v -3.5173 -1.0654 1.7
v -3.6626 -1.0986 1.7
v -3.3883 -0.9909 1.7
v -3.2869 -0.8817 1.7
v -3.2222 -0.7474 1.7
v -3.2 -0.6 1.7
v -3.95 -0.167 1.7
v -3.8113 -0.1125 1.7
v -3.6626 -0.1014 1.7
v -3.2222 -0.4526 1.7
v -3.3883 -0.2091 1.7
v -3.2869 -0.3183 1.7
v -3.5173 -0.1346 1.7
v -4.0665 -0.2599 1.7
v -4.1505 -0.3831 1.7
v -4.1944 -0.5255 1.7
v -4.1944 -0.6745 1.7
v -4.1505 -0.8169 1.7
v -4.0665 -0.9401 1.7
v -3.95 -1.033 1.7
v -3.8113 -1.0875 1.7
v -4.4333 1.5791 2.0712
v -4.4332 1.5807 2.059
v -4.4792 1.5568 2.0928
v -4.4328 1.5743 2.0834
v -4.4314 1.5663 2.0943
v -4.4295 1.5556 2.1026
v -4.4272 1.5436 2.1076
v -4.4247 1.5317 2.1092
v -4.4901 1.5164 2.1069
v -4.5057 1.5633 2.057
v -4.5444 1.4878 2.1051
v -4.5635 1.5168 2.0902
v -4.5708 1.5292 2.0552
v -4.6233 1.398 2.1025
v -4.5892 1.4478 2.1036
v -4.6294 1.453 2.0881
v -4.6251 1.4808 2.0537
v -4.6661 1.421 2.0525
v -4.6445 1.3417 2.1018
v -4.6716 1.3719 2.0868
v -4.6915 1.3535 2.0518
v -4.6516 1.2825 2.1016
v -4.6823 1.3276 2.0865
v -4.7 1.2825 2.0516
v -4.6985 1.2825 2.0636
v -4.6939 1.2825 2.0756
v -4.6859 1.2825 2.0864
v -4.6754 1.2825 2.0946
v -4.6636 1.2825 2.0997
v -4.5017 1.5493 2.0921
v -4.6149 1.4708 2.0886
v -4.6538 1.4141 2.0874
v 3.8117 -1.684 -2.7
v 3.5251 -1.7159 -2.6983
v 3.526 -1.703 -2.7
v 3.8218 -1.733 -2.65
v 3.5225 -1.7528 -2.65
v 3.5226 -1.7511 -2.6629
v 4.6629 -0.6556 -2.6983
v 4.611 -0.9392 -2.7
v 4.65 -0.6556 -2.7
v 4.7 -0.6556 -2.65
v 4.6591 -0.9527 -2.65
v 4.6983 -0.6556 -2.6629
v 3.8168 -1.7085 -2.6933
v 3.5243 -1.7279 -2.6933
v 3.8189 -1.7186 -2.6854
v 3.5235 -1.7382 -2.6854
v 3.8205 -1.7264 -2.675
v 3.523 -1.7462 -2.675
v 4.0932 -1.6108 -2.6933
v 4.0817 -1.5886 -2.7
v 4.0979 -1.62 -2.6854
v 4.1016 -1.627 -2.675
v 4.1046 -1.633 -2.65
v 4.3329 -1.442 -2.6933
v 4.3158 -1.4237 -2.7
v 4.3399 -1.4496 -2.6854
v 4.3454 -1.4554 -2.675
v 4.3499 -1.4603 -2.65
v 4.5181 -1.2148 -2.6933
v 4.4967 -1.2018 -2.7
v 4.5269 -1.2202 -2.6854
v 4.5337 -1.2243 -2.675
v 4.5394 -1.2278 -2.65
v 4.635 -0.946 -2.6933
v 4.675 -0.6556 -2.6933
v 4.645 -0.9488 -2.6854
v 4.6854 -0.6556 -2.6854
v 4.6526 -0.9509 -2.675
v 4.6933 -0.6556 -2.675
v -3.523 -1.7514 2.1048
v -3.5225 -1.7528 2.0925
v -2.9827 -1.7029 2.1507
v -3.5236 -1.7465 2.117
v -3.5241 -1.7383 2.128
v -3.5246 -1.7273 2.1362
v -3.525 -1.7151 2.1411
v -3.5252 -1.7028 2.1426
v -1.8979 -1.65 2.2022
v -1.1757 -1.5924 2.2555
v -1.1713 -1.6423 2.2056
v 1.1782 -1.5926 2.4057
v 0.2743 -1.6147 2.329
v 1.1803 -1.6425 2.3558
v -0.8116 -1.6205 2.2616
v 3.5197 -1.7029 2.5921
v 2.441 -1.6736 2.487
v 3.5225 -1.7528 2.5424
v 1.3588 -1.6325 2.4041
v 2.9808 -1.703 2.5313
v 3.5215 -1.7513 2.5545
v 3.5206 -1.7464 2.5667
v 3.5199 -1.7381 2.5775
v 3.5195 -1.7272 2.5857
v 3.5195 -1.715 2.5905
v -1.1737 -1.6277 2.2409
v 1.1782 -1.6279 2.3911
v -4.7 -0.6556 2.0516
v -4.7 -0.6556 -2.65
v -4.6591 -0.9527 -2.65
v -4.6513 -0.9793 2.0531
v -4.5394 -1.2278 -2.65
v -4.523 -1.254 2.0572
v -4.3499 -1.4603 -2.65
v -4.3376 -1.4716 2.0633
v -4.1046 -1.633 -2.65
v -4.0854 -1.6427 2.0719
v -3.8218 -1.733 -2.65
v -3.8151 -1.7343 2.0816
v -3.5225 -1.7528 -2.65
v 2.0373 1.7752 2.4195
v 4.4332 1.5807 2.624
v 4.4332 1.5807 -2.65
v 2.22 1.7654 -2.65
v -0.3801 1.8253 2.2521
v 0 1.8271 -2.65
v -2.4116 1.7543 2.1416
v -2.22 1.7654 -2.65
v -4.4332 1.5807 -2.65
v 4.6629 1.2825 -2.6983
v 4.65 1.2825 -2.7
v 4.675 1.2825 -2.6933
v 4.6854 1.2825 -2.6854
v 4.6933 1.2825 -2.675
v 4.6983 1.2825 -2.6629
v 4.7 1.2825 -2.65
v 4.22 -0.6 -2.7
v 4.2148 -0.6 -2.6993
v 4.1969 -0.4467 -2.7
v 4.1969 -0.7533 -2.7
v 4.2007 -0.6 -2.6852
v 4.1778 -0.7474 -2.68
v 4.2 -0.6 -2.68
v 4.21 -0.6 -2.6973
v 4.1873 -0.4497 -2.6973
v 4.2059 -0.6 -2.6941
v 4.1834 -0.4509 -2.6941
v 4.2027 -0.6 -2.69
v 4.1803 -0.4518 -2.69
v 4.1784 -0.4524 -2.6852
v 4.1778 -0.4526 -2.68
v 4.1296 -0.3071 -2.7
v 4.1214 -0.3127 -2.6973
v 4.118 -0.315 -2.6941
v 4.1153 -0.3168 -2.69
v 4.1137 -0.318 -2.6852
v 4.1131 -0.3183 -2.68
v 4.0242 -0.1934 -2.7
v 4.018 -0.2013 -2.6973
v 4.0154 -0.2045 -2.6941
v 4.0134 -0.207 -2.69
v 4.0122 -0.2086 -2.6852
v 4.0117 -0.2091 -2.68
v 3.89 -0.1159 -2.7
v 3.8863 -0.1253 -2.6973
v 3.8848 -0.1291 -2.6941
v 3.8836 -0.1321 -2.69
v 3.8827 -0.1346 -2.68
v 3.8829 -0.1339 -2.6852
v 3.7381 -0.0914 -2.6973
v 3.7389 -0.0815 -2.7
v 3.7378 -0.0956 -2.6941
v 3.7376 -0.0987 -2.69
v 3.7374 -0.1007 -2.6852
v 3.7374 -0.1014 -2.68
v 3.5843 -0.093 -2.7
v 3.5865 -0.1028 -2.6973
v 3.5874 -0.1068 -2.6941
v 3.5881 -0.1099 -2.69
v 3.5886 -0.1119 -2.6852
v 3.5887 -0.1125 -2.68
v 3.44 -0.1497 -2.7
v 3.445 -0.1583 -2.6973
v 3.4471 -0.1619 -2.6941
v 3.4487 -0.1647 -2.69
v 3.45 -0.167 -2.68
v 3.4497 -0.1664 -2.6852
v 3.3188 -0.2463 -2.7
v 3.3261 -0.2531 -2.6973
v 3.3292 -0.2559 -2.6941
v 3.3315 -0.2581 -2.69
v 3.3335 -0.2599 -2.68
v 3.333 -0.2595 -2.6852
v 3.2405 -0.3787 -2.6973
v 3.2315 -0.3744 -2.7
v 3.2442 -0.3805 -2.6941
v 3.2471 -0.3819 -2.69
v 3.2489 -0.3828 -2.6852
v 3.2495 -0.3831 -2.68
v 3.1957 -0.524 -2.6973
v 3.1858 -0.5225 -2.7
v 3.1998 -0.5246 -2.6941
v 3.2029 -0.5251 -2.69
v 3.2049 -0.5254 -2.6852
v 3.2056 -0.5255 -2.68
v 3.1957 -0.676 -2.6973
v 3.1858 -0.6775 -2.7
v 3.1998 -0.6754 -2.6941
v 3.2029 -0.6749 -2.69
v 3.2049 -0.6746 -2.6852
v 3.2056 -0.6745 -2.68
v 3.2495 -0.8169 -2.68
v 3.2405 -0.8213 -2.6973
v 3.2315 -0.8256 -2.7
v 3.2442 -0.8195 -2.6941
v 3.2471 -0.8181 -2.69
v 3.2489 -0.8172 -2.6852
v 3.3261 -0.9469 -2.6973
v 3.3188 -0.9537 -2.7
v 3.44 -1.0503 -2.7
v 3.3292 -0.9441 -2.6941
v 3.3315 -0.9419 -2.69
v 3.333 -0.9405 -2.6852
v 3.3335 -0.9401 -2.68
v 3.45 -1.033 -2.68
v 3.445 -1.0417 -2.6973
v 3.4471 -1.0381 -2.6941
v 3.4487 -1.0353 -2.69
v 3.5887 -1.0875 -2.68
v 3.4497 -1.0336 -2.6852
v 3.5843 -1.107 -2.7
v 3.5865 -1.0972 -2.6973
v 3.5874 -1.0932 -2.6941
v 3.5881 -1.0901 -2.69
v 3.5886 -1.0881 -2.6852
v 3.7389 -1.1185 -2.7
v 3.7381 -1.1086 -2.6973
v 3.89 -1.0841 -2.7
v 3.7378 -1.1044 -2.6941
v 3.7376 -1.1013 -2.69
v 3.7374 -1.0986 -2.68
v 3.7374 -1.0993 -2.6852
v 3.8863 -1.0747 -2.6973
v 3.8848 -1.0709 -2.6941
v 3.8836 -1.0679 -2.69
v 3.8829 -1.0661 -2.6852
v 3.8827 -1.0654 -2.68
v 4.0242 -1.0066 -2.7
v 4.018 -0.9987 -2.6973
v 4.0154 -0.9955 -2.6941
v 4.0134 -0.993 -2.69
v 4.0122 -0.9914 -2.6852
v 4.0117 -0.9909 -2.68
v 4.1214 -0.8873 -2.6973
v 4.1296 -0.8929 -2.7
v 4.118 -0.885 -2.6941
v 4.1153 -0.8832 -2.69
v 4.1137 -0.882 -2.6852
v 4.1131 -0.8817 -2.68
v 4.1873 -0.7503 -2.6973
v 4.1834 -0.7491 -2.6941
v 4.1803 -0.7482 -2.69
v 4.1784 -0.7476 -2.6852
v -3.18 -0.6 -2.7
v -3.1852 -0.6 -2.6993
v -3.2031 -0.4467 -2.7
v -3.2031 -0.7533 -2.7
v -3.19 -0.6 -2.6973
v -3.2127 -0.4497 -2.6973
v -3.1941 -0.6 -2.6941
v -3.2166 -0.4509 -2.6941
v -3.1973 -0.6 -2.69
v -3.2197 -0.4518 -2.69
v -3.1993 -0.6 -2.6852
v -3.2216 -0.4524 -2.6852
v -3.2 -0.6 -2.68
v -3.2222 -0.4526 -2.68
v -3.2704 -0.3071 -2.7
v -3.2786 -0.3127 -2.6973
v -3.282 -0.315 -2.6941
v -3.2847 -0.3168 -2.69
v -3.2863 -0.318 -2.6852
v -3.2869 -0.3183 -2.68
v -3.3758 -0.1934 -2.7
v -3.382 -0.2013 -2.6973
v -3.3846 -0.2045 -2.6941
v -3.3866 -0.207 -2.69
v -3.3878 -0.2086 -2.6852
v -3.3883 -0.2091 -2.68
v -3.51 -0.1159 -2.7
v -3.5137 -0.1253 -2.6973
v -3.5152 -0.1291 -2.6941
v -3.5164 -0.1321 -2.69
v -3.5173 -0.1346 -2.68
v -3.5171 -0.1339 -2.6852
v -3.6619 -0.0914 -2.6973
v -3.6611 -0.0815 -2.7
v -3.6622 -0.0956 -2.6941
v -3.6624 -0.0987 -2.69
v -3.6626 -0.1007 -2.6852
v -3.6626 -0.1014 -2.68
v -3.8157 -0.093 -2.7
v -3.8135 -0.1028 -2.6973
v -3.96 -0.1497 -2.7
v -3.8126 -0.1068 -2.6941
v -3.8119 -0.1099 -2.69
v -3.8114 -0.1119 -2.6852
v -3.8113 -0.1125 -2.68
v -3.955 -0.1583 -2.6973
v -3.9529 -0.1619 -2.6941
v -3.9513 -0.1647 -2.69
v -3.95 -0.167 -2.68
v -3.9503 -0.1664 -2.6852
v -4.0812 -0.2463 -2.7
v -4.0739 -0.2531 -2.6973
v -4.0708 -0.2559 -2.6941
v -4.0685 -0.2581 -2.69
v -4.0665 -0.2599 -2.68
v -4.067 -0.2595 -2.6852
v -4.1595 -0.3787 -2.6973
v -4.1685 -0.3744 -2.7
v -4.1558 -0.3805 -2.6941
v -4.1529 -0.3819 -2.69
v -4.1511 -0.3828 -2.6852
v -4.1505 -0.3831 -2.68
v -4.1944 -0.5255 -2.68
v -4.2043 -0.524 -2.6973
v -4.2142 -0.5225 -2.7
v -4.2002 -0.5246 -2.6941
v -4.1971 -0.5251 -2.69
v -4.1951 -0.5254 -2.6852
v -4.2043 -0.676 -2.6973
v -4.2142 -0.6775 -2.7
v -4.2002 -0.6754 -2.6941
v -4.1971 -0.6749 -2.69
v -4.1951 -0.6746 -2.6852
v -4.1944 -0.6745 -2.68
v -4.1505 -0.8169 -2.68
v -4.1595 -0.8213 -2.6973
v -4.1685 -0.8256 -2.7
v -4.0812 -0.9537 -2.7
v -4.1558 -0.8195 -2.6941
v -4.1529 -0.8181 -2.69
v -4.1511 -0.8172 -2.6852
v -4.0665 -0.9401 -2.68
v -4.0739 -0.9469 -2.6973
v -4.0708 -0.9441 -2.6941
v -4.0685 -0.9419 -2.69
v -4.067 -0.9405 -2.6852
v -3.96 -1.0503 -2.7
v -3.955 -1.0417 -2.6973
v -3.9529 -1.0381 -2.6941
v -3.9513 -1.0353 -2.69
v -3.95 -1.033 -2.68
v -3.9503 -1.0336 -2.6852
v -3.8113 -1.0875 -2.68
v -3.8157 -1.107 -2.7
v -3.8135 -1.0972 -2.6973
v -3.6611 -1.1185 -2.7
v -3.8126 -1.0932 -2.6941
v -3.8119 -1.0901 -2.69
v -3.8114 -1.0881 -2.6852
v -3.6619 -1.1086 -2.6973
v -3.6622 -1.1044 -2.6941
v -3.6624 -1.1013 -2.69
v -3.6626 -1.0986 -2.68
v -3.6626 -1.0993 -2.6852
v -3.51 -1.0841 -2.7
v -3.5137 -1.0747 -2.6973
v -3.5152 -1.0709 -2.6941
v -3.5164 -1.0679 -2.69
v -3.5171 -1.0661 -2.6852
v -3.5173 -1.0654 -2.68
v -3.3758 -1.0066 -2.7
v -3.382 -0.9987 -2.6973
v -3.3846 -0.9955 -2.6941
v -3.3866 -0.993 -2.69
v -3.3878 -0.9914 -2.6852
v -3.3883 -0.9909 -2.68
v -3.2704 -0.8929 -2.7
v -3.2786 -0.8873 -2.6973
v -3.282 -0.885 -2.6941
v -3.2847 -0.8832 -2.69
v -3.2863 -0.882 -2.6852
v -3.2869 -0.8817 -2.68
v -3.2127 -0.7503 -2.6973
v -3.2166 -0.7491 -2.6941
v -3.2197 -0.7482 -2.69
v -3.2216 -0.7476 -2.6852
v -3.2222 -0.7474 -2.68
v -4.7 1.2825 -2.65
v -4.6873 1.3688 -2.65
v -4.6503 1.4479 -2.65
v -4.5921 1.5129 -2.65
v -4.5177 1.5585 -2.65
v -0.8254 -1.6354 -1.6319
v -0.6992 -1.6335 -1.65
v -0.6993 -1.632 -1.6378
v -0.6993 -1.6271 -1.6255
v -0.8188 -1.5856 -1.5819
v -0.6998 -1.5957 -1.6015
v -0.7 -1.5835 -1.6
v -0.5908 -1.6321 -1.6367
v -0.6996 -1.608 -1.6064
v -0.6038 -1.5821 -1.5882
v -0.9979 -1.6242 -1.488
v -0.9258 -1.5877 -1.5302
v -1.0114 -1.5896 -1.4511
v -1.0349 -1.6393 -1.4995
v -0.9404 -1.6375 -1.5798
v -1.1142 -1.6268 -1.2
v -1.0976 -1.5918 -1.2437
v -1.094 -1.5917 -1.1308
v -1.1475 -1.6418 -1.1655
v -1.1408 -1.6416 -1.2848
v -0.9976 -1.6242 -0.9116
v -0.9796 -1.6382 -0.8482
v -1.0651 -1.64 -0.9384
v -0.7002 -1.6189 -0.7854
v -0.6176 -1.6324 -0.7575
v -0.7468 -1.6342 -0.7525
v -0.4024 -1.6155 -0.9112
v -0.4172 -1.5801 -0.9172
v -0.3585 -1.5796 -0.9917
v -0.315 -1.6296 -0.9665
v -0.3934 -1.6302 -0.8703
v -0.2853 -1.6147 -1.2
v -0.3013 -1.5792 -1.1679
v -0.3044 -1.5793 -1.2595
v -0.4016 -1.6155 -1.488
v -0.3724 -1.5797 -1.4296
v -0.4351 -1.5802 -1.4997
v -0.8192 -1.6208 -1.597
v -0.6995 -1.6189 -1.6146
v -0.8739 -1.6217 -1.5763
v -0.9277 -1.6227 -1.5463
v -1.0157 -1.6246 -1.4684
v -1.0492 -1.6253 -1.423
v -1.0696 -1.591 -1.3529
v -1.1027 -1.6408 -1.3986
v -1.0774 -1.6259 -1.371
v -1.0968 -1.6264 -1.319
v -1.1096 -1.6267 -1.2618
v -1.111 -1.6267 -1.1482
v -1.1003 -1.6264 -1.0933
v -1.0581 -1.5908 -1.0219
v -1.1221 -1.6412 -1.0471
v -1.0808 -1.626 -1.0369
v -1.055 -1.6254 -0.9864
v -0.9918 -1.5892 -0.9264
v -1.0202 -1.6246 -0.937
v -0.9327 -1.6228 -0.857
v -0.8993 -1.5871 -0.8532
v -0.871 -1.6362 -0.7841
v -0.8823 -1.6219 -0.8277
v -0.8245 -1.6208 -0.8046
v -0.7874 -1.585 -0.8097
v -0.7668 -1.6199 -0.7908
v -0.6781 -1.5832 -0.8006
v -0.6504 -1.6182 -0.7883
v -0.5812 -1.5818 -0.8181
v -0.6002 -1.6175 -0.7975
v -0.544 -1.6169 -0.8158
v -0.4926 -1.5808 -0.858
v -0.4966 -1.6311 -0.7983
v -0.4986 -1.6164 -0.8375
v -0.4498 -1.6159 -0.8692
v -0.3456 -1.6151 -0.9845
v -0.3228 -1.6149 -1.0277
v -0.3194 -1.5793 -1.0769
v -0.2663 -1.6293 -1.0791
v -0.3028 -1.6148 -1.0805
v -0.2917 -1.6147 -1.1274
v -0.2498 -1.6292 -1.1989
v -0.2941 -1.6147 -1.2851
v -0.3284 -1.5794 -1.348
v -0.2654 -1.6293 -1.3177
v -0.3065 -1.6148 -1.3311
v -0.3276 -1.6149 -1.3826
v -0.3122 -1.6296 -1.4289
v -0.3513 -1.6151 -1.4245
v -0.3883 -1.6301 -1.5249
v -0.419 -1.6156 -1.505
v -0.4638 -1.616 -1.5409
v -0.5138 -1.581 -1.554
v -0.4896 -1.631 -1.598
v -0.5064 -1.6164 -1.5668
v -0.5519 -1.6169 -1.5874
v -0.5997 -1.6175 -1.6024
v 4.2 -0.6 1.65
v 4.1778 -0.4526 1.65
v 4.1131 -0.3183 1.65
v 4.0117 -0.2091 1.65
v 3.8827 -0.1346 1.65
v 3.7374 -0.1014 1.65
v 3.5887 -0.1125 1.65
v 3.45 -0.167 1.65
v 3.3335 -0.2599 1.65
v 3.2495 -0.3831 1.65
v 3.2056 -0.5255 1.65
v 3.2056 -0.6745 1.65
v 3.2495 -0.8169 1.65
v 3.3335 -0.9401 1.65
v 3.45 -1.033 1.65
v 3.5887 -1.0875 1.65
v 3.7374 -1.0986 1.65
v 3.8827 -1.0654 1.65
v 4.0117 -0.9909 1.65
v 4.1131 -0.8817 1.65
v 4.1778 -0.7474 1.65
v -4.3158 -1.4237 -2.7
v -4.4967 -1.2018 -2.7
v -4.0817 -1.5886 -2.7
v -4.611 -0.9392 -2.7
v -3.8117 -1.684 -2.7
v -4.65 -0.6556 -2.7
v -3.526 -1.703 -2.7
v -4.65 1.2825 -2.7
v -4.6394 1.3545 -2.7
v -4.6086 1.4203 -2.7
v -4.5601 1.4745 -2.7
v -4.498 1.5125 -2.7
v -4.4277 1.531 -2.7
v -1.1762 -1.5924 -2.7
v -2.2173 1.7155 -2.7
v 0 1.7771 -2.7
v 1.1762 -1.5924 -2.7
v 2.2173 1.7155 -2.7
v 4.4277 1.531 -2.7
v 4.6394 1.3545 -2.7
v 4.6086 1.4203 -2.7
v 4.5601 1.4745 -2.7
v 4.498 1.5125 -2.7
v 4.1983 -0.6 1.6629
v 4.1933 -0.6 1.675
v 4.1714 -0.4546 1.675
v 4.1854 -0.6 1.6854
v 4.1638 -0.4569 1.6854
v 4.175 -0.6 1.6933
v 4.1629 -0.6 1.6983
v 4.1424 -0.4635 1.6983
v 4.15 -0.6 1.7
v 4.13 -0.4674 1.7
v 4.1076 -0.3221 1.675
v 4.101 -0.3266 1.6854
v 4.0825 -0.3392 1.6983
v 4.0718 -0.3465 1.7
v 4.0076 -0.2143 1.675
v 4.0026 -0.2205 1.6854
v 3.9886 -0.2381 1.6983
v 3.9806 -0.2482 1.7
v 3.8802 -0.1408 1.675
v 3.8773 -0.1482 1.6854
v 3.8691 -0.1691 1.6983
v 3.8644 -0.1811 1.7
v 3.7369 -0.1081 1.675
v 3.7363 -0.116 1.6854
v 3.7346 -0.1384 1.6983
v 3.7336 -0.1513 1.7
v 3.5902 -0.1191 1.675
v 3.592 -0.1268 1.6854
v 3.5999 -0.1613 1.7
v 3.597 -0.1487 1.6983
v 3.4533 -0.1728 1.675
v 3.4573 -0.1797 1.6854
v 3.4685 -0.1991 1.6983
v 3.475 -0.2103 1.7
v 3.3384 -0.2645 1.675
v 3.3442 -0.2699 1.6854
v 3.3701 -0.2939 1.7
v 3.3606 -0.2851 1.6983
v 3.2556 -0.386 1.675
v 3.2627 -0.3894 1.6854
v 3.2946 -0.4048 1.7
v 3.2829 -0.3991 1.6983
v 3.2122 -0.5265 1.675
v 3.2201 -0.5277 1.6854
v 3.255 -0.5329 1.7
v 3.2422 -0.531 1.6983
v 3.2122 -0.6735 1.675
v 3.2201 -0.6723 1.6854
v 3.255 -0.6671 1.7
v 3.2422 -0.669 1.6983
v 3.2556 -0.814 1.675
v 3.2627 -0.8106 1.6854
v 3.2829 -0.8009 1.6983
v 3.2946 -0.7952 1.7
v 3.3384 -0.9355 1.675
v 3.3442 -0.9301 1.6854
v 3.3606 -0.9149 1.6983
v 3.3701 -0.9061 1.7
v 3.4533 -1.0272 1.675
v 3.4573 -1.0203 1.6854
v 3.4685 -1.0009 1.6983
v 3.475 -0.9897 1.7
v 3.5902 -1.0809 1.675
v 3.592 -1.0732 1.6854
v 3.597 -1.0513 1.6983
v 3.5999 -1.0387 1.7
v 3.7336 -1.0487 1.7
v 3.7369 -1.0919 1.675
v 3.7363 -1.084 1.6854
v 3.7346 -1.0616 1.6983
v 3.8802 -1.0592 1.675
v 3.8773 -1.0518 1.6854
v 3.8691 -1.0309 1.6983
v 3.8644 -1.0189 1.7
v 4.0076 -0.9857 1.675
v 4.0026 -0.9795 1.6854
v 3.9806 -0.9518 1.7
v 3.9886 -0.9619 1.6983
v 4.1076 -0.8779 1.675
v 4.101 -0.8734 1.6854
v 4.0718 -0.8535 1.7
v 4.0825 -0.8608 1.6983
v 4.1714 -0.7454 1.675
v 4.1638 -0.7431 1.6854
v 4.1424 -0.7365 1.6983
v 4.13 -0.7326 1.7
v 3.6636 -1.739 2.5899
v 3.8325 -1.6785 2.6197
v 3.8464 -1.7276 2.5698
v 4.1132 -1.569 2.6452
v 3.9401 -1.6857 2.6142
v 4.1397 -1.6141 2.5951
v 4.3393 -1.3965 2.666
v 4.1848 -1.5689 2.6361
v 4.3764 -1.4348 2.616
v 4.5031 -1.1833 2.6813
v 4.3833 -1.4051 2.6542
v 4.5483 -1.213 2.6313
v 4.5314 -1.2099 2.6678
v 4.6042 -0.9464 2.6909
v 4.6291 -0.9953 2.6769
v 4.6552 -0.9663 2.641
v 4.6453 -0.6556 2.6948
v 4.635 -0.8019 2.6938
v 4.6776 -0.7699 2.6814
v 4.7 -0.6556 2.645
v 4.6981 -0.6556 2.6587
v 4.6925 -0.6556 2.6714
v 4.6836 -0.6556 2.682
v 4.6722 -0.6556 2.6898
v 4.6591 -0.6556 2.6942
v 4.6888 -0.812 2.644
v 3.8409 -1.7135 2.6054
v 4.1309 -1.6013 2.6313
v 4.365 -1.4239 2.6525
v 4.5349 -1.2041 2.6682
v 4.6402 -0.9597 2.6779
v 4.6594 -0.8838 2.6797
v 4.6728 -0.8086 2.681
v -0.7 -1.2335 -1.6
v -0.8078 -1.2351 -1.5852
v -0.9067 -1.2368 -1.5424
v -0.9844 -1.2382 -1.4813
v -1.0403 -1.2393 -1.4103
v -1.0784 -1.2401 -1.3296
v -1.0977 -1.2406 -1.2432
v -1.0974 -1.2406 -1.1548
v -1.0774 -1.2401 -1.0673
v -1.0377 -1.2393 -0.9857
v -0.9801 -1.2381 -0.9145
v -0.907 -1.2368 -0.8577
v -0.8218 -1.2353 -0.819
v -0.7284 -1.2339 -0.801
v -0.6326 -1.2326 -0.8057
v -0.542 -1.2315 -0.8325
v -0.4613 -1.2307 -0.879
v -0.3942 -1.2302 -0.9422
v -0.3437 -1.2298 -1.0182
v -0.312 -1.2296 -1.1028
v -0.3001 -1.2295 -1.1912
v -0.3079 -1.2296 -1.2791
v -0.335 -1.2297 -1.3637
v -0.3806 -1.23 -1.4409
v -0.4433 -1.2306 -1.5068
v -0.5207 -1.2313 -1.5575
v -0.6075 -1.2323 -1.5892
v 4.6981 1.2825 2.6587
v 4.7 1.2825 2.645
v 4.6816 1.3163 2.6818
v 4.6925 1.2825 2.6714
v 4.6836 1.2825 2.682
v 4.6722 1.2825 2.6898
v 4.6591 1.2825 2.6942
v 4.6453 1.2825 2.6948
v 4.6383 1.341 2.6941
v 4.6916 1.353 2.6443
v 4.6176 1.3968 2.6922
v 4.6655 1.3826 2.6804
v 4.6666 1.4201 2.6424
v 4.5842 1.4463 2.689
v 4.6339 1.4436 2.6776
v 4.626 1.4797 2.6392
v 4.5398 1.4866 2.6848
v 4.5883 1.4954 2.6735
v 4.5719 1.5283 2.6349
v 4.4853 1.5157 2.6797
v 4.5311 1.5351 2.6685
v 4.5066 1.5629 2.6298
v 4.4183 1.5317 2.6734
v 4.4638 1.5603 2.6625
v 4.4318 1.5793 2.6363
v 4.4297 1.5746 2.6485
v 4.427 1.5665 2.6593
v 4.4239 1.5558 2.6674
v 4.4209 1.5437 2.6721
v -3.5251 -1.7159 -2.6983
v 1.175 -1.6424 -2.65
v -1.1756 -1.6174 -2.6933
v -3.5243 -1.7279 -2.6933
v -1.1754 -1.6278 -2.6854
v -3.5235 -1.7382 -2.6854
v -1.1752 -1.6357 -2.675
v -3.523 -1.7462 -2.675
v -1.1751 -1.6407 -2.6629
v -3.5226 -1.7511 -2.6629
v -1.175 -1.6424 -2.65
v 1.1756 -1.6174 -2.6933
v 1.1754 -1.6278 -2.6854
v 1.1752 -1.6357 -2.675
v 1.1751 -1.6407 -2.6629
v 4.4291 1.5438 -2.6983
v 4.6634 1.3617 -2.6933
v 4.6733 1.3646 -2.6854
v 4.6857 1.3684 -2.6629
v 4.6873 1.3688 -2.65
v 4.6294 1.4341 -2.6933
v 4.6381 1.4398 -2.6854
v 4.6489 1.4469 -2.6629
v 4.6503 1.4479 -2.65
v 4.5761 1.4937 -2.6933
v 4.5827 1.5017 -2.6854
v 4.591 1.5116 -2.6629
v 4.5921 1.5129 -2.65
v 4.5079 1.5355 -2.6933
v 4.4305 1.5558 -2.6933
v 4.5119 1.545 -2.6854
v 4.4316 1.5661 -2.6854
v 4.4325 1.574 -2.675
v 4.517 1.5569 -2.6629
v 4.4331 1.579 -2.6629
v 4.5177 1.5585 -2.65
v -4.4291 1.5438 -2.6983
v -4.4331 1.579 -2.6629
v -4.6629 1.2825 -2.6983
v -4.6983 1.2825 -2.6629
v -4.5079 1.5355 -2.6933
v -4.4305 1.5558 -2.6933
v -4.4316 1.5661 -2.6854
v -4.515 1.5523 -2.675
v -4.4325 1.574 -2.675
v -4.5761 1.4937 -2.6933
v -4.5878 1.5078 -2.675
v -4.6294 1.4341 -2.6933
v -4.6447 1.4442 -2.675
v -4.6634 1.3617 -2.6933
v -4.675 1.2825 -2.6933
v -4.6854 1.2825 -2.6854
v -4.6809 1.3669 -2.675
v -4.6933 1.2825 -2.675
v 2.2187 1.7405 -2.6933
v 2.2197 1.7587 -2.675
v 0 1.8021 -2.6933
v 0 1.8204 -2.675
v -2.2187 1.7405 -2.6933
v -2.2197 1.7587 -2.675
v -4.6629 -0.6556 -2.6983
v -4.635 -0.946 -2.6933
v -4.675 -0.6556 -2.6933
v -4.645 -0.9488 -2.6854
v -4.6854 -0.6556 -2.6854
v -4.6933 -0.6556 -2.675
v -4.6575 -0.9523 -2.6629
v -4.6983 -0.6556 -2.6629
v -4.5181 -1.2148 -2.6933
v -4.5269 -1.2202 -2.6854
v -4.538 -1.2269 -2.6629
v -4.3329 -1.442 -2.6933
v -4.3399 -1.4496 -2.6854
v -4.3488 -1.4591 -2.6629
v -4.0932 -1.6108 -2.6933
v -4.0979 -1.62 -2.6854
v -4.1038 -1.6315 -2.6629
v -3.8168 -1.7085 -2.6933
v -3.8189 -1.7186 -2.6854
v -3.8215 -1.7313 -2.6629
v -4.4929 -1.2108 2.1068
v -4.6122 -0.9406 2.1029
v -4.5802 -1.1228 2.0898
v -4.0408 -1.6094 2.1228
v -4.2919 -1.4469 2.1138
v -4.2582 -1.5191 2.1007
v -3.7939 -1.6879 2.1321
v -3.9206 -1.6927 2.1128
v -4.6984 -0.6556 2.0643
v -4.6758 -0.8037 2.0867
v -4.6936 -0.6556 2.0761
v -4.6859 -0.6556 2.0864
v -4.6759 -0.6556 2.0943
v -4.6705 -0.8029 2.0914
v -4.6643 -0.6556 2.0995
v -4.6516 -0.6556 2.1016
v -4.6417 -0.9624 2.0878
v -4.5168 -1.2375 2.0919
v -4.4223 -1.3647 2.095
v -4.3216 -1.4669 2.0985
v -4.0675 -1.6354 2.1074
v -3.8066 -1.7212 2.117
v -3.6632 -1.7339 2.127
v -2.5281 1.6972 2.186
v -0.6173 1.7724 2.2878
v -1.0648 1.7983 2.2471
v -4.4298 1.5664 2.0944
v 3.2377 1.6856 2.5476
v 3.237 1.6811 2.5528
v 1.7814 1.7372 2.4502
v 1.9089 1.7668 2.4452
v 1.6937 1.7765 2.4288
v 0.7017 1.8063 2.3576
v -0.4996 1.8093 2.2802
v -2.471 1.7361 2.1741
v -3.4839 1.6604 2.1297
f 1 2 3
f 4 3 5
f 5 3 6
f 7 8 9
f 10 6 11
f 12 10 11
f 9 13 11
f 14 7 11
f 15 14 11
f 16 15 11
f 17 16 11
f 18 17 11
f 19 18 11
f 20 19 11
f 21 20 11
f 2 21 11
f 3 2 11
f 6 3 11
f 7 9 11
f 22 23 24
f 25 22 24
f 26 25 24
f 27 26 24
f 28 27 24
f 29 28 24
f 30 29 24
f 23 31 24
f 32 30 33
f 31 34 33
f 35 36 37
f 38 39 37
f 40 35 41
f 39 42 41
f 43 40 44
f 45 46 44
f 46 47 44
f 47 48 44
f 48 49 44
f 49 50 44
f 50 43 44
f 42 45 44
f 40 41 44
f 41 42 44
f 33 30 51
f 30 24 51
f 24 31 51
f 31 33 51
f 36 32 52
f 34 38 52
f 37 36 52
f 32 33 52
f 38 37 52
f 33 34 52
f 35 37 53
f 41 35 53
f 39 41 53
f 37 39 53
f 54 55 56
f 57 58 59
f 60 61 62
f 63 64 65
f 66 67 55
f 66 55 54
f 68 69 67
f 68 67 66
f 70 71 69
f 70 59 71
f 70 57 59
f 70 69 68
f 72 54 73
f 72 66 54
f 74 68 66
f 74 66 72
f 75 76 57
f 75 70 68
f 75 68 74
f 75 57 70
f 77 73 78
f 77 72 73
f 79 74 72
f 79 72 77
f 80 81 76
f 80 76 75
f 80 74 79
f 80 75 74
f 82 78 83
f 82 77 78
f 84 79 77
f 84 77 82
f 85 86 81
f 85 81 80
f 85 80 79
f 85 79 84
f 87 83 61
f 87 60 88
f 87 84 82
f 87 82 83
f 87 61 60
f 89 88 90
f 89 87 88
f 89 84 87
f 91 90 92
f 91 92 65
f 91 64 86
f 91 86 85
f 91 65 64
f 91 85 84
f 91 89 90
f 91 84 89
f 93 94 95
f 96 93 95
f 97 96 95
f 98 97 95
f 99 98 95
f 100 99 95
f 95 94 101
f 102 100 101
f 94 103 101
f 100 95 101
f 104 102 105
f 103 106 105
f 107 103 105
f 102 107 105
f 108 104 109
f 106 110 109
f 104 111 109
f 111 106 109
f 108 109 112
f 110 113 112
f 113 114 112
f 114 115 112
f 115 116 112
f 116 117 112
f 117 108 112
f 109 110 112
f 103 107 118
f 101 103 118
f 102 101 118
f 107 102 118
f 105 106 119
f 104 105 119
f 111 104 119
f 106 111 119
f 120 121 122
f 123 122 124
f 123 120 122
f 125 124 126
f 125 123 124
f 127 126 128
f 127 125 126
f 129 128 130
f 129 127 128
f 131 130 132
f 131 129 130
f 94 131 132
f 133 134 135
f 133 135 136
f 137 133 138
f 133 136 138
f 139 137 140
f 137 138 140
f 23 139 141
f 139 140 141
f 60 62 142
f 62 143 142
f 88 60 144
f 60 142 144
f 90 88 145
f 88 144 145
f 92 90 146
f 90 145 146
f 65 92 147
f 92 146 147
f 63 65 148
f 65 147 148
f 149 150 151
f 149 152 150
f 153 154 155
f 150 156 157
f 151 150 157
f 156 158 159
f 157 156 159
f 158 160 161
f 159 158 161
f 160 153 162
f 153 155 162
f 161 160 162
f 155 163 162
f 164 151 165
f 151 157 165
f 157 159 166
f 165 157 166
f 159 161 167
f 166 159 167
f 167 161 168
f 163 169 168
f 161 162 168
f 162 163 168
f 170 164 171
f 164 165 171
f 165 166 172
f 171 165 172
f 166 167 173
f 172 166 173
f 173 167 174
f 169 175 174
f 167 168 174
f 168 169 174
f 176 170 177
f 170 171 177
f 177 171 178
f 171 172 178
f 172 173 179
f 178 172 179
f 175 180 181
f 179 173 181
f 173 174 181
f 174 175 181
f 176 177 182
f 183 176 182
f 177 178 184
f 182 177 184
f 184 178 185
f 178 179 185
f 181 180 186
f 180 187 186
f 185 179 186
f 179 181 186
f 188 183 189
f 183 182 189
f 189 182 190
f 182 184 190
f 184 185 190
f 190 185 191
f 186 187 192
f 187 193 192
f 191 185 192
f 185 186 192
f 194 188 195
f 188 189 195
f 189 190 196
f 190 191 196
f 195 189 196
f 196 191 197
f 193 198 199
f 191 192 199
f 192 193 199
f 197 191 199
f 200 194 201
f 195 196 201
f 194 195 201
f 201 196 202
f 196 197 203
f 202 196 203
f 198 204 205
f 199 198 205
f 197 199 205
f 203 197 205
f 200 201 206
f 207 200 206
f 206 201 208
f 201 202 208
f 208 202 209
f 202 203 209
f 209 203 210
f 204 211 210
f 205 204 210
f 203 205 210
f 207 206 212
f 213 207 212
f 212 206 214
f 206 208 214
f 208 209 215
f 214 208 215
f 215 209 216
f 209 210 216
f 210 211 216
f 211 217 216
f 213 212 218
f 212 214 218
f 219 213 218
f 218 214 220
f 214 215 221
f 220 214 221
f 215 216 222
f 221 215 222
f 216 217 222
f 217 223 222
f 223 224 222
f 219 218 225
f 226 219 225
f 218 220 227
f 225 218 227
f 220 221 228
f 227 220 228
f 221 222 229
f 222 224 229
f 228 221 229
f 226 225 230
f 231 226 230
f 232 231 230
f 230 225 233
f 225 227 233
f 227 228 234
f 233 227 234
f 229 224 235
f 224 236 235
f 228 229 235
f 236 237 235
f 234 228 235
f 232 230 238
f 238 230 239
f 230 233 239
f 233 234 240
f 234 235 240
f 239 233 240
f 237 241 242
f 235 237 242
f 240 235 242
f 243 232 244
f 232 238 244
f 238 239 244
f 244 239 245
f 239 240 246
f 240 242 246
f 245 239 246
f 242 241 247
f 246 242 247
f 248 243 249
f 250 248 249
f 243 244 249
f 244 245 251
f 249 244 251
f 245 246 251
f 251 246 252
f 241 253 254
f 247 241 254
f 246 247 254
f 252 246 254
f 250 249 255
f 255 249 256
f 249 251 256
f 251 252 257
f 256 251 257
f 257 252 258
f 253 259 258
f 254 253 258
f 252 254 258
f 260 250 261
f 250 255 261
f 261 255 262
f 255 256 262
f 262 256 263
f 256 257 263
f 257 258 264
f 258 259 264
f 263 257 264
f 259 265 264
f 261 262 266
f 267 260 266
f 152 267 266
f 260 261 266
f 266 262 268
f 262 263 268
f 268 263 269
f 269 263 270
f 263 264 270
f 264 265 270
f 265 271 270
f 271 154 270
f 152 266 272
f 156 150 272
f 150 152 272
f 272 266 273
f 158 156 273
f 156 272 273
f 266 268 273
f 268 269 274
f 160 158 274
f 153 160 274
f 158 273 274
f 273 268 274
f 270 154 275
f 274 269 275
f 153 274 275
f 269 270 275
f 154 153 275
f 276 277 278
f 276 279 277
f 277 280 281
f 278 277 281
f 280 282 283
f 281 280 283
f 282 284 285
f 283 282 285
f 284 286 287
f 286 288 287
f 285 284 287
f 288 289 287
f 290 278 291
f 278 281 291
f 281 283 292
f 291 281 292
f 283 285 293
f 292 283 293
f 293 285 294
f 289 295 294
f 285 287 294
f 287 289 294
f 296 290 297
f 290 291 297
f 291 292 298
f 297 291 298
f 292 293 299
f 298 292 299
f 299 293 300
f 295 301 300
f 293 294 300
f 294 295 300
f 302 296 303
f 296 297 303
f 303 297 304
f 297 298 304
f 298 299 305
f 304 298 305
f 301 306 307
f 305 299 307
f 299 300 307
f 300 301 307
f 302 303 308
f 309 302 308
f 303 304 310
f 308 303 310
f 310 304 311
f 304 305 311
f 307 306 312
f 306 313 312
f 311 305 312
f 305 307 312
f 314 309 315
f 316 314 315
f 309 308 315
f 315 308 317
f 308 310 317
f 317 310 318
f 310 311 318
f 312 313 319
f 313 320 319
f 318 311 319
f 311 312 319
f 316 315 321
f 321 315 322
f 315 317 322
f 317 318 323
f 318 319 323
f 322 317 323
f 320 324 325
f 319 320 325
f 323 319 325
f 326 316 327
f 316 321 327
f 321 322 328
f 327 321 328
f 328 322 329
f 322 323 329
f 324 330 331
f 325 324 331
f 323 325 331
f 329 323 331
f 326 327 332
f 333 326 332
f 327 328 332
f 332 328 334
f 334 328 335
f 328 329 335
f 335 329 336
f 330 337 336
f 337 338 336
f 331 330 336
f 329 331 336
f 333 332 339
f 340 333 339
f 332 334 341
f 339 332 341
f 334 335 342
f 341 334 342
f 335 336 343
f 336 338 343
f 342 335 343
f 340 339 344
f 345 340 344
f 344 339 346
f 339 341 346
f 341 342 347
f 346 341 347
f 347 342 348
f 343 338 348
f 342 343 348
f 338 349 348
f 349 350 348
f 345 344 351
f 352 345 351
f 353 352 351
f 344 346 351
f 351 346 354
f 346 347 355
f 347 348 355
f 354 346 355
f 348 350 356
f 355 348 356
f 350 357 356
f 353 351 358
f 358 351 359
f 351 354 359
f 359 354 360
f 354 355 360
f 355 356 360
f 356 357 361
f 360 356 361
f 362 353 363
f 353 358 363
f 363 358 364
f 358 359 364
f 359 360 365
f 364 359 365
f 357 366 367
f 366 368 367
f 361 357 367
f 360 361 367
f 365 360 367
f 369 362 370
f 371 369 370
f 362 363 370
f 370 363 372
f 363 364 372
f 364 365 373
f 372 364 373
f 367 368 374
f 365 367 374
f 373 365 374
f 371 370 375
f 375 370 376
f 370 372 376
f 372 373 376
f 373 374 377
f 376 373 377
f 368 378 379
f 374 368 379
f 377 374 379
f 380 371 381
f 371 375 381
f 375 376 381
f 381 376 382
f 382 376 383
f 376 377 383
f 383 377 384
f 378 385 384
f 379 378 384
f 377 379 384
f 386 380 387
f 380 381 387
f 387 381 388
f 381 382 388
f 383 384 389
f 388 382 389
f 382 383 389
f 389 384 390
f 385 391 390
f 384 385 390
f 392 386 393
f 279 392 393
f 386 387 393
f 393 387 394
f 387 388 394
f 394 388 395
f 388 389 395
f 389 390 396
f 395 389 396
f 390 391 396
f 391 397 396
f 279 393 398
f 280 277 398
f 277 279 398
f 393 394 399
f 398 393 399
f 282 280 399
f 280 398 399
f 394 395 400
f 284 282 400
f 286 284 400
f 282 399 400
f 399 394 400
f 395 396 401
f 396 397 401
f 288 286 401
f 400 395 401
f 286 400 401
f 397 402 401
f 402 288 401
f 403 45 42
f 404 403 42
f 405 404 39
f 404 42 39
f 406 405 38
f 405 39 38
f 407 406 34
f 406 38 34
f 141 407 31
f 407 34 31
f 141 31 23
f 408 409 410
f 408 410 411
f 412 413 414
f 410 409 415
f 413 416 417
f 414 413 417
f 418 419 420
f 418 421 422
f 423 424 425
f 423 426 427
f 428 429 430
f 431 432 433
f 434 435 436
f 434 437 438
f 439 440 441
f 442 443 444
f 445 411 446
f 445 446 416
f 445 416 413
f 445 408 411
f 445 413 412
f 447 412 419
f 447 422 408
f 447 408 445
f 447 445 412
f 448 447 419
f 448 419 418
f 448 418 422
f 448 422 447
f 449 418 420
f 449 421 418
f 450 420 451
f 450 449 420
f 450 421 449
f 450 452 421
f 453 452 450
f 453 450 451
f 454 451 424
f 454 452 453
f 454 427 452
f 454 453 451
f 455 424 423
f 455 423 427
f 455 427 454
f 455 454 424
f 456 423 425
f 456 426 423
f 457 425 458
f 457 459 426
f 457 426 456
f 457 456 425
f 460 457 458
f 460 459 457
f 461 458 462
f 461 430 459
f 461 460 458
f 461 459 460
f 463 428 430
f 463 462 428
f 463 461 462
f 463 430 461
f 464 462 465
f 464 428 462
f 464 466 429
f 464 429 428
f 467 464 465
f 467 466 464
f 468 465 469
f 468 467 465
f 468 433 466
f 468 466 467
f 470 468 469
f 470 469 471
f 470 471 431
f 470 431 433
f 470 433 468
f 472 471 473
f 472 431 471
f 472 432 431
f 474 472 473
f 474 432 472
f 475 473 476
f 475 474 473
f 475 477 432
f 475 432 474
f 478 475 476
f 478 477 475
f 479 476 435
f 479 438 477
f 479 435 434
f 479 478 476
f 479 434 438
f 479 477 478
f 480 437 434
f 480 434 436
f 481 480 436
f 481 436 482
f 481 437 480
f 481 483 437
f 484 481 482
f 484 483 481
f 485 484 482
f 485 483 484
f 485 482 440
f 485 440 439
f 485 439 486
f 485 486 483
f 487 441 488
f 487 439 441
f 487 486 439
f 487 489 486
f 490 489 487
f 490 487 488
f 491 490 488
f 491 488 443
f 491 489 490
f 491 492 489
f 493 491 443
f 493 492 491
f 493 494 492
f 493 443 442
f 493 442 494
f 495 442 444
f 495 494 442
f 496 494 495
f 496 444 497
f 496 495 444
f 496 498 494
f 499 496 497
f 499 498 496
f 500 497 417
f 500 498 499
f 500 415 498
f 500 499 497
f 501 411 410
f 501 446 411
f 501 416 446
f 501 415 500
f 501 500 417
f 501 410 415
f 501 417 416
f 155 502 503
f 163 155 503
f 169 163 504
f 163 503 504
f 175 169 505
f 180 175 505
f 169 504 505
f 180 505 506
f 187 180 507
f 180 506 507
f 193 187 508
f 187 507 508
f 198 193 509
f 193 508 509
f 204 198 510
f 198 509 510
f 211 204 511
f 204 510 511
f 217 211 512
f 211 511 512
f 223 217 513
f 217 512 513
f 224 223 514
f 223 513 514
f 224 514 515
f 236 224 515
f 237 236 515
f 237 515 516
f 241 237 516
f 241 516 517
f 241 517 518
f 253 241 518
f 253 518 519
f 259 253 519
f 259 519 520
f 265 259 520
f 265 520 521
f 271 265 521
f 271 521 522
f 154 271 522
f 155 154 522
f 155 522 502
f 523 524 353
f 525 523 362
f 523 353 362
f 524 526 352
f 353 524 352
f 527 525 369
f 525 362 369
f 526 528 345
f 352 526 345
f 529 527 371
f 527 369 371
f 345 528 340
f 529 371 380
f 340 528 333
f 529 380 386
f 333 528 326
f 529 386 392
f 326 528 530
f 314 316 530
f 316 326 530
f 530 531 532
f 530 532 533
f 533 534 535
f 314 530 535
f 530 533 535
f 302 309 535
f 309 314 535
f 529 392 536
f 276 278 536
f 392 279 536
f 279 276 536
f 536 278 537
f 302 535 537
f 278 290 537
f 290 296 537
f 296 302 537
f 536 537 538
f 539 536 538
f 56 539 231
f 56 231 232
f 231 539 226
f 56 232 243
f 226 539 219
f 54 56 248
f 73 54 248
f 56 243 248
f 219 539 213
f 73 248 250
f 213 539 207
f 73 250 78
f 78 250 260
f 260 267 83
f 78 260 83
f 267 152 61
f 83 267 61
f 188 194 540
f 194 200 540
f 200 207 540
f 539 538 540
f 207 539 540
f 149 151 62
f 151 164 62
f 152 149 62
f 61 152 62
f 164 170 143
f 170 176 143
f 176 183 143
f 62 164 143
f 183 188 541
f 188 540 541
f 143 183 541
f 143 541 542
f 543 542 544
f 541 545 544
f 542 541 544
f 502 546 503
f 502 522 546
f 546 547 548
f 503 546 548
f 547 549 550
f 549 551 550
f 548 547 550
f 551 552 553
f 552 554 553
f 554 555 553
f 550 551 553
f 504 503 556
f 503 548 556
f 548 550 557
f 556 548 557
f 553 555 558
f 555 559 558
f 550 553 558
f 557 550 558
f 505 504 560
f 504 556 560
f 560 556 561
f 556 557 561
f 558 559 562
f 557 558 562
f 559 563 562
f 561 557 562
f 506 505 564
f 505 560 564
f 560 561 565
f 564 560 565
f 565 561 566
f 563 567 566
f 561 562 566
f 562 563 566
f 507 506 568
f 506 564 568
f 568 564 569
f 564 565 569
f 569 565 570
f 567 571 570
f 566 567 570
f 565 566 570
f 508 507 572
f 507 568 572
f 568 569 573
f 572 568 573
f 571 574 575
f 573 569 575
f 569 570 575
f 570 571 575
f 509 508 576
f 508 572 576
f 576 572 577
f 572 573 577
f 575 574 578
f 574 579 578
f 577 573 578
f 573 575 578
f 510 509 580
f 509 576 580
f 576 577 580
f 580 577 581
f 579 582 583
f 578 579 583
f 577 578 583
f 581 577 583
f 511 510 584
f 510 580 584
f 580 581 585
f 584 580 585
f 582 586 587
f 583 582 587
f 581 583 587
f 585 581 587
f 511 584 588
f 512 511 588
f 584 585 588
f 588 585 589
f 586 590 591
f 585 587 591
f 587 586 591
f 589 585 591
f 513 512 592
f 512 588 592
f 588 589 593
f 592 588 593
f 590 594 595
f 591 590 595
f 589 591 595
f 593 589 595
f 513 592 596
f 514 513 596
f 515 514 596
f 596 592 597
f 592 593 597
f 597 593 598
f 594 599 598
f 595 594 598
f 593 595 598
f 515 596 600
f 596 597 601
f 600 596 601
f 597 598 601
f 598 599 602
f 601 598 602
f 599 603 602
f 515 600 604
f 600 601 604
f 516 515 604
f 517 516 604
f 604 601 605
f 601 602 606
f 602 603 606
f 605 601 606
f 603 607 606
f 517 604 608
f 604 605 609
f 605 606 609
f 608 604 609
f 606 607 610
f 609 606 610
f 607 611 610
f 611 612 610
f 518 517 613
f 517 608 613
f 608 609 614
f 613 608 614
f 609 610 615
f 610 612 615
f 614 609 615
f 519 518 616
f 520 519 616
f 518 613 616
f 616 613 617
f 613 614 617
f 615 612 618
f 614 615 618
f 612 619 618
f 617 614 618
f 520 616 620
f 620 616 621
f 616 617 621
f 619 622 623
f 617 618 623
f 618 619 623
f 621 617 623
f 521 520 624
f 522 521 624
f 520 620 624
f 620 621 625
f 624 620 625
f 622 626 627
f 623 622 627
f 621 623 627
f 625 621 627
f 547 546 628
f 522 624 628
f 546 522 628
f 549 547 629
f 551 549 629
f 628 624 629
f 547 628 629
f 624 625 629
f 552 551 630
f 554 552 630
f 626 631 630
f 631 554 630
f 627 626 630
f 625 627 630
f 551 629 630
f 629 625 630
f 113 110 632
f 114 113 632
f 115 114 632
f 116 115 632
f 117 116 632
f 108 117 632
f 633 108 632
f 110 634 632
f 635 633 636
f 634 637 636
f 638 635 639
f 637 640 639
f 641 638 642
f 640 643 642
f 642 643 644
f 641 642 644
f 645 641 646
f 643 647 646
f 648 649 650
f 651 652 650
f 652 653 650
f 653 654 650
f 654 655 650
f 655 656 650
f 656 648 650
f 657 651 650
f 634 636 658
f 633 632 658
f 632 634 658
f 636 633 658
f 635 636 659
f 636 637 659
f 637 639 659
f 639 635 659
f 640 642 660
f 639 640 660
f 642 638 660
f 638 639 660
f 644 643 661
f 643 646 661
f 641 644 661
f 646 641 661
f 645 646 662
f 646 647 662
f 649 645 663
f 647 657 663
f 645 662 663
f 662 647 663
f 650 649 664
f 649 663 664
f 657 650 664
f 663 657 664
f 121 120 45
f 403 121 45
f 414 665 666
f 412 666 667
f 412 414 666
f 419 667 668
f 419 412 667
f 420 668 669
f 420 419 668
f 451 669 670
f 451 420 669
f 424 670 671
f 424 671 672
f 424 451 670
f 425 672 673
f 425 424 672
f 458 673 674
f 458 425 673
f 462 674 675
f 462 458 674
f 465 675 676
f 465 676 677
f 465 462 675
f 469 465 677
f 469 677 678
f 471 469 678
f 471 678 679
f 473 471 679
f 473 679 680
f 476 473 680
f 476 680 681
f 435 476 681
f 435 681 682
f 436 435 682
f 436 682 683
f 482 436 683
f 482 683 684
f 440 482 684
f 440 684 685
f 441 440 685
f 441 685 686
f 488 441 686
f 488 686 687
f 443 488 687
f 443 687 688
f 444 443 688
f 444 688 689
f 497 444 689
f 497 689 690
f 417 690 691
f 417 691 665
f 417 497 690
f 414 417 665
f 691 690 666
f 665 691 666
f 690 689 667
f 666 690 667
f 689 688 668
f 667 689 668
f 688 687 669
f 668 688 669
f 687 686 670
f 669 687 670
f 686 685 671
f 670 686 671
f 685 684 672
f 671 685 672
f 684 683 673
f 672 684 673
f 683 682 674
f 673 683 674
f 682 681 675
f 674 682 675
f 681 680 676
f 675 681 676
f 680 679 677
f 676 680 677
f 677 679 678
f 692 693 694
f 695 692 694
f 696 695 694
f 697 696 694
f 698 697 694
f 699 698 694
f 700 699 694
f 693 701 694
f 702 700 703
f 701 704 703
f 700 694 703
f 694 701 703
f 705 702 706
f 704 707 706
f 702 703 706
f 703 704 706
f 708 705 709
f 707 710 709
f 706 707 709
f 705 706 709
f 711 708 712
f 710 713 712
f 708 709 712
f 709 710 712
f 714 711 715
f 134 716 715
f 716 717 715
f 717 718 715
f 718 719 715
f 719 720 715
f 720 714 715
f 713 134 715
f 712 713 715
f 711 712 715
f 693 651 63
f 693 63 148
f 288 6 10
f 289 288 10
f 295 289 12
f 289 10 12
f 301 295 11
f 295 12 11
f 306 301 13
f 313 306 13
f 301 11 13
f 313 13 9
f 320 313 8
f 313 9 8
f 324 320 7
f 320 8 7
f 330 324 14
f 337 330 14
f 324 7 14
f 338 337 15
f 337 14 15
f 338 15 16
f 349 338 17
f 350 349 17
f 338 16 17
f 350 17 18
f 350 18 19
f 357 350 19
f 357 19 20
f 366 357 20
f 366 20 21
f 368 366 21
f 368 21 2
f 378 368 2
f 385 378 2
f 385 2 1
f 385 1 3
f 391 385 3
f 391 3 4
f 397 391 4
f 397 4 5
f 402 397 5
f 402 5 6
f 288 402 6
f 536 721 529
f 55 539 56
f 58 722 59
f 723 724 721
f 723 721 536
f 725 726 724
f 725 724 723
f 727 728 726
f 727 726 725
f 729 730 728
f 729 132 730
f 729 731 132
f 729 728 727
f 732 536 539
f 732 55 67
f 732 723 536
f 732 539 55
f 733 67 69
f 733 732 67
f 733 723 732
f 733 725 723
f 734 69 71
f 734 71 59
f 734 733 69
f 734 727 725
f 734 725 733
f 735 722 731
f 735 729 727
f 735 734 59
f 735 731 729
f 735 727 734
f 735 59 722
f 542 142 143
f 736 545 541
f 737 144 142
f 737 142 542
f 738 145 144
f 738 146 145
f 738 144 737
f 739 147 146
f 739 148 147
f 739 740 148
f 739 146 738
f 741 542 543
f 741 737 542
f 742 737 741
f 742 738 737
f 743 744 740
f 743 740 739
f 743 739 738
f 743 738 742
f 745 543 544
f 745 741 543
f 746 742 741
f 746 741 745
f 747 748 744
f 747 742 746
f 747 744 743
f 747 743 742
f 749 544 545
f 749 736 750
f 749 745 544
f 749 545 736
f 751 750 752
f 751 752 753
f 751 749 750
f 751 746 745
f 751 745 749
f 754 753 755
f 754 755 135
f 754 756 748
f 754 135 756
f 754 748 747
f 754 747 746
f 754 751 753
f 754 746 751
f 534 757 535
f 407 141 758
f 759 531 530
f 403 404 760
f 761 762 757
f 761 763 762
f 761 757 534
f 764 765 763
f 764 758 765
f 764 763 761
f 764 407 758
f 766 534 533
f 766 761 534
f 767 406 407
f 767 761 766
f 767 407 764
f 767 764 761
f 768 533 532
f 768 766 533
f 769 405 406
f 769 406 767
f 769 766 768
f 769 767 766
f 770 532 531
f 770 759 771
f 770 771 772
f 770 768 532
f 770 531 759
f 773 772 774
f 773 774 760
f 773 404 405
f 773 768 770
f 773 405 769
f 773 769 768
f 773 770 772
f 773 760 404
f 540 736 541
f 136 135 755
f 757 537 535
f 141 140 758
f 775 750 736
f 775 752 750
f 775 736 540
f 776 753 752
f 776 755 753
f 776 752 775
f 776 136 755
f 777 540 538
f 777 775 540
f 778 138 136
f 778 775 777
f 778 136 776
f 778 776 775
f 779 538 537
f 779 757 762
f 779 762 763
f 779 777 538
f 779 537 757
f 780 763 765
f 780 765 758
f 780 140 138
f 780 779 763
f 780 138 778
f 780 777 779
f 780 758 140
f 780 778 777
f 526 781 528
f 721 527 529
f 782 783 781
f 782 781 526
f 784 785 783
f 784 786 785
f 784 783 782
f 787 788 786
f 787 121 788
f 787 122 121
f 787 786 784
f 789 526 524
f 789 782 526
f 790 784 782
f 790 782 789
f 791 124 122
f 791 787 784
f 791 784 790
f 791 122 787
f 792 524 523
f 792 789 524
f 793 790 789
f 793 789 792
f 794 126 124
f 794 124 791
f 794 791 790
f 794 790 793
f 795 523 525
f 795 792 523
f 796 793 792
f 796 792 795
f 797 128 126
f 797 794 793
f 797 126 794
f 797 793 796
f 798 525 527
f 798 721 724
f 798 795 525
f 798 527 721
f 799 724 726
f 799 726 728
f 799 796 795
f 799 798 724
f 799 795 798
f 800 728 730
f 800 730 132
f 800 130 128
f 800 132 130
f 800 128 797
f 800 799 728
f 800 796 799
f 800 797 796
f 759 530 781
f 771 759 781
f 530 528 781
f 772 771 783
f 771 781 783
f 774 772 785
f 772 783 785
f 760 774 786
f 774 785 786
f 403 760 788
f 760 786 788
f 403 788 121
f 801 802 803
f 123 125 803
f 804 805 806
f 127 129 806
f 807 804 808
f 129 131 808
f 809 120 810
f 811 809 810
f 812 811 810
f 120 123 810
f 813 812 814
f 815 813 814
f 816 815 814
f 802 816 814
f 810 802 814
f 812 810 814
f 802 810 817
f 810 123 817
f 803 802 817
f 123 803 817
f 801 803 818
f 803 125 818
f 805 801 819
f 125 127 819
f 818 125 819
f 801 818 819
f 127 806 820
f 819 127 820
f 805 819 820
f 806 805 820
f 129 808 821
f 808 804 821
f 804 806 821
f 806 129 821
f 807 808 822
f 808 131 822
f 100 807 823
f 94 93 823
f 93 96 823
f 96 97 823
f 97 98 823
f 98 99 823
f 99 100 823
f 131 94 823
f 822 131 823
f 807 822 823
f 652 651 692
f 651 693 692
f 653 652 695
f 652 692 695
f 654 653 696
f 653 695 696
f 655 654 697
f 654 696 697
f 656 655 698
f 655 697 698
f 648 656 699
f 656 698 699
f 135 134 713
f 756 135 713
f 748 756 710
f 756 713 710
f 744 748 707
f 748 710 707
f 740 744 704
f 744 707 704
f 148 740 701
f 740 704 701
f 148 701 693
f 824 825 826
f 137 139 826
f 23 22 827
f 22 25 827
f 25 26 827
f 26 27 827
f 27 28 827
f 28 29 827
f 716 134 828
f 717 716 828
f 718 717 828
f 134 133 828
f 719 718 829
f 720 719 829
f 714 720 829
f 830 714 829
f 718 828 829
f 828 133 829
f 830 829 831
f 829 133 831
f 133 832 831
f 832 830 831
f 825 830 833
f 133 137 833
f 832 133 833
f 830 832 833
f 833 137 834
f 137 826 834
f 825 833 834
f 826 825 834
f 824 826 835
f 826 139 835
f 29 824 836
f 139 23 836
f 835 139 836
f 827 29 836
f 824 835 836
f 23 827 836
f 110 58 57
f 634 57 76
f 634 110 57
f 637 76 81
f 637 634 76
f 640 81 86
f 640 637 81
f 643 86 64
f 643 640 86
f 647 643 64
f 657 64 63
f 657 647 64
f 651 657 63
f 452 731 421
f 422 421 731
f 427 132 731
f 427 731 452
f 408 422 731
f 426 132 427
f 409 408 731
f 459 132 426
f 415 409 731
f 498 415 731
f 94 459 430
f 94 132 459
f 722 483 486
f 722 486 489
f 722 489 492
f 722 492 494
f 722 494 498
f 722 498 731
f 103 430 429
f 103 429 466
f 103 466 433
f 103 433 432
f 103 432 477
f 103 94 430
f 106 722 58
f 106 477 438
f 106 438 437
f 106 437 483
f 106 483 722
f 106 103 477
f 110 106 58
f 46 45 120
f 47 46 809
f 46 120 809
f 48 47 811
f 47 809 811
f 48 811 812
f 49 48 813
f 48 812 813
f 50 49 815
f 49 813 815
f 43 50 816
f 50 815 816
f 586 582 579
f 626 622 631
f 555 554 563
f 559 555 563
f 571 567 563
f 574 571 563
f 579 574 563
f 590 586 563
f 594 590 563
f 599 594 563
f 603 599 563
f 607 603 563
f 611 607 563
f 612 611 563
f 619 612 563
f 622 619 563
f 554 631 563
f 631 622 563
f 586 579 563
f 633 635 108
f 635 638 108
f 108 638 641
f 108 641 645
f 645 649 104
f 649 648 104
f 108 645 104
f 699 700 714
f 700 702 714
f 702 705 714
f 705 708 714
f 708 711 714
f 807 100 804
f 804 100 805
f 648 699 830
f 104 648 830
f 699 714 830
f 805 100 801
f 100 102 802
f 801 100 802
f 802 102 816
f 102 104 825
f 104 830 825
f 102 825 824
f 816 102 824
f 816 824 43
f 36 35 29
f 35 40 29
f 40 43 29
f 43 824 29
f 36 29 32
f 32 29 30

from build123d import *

# Parameters (mm, degrees)
SKETCH1_W               = 9.4
SKETCH1_H               = 3.7
BOSS_EXTRUDE1_DEPTH     = 2.7
CUT_EXTRUDE1_DEPTH      = 7.6
FILLET1_R               = 1.1
FILLET2_R               = 0.3
CUT_EXTRUDE2_START      = -1
SKETCH3_R               = 0.5
CUT_EXTRUDE2_DEPTH      = 13
FILLET4_R               = 0.02
CUT_EXTRUDE3_DEPTH      = 5
FILLET5_R               = 0.05
CUT_EXTRUDE4_REACH      = 18.72
CUT_EXTRUDE4_END_RADIUS = 50.4
CUT_EXTRUDE4_START      = -11
SKETCH5_R               = 0.4
FILLET6_R               = 0.05


with BuildPart() as part:
    # Sketch1 → Boss-Extrude1 (new, symmetric)
    with BuildSketch(Plane.XY):
        Rectangle(SKETCH1_W, SKETCH1_H)
    extrude(amount=BOSS_EXTRUDE1_DEPTH, both=True)

    # Sketch2 → Cut-Extrude1 (cut, symmetric)
    with BuildSketch(Plane.XY.offset(2.7)):
        with BuildLine():
            Line((-4.7, 1.55), (-7.120690005, 4.011417256))
            Line((-7.120690005, 4.011417256), (5.535860742, 3.886722174))
            Line((5.535860742, 3.886722174), (4.7, 1.55))
            ThreePointArc((4.7, 1.55), (0, 1.827084699), (-4.7, 1.55))
        make_face()
        with BuildLine():
            Line((4.7, -1.85), (0.350623614, -3.782025322))
            Line((0.350623614, -3.782025322), (-4.7, -1.85))
            ThreePointArc((-4.7, -1.85), (0, -1.628609864), (4.7, -1.85))
        make_face()
    extrude(amount=CUT_EXTRUDE1_DEPTH, both=True, mode=Mode.SUBTRACT)

    # Fillet1
    fillet1_edges = [part.edges().sort_by_distance(p)[0] for p in [
        (4.7, -1.85, 0),
        (-4.7, -1.85, 0),
    ]]
    fillet(fillet1_edges, radius=FILLET1_R)

    # Fillet2
    fillet2_edges = [part.edges().sort_by_distance(p)[0] for p in [
        (4.7, 1.55, 0),
        (-4.7, 1.55, 0),
    ]]
    fillet(fillet2_edges, radius=FILLET2_R)

    # Sketch3 → Cut-Extrude2 (cut)
    with BuildSketch(Plane.XY.offset(2.7).offset(CUT_EXTRUDE2_START)):
        with Locations((3.7, -0.6)):
            Circle(SKETCH3_R)
        with Locations((-3.7, -0.6)):
            Circle(SKETCH3_R)
    extrude(amount=-CUT_EXTRUDE2_DEPTH, mode=Mode.SUBTRACT)

    # Fillet4
    fillet4_edges = [part.edges().sort_by_distance(p)[0] for p in [
        (3.2, -0.6, -2.7),
        (-4.2, -0.6, -2.7),
    ]]
    fillet(fillet4_edges, radius=FILLET4_R)

    # Sketch4 → Cut-Extrude3 (cut, symmetric)
    with BuildSketch(Plane(origin=(0, 0, 0), x_dir=(1, 0, 0), z_dir=(0, 1, 0))):
        with BuildLine():
            Line((-4.7, -2.1), (-6.612719149, -3.713907535))
            Line((-6.612719149, -3.713907535), (6.420677859, -4.574089961))
            Line((6.420677859, -4.574089961), (4.7, -2.7))
            ThreePointArc((4.7, -2.7), (0.004710726, -2.326198627), (-4.7, -2.1))
        make_face()
    extrude(amount=CUT_EXTRUDE3_DEPTH, both=True, mode=Mode.SUBTRACT)

    # Fillet5
    fillet5_edges = [part.edges().sort_by_distance(p)[0] for p in [
        (4.7, 0.3134624, -2.7),
        (4.7, 0.3134624, 2.7),
        (0, -1.628609864, -2.7),
        (-4.349918456, -1.460327621, -2.7),
        (4.349918456, -1.460327621, -2.7),
        (0, 1.827084699, -2.7),
        (-4.7, 0.3134624, -2.7),
        (-4.623578634, 1.482534062, -2.7),
        (4.623578634, 1.482534062, -2.7),
        (3.2, -0.6, 1.7),
        (-4.623553452, 1.482562201, 2.102492735),
        (4.349071617, -1.461115931, 2.666925629),
        (-4.349757648, -1.460477444, 2.11174073),
        (4.623384051, 1.482751335, 2.692708088),
        (0.002641899, -1.628609931, 2.326066603),
        (-4.7, 0.3134624, 2.1),
        (0.004177998, 1.827084481, 2.326164624),
    ]]
    fillet(fillet5_edges, radius=FILLET5_R)

    # Cut-Extrude4: up to this cylinder (the profile starts inside it)
    cut_extrude4_end = Plane(origin=(0, -51.628609864, -1.2), z_dir=(0, 0, 1)) * Cylinder(CUT_EXTRUDE4_END_RADIUS, 139.24, mode=Mode.PRIVATE)
    # Sketch5 → Cut-Extrude4 (cut, up to the surface)
    with BuildSketch(Plane(origin=(0, 0, 0), x_dir=(1, 0, 0), z_dir=(0, 1, 0)).offset(CUT_EXTRUDE4_START), mode=Mode.PRIVATE) as cut_extrude4_sk1:
        with Locations(Location((-0.7, 1.2, 0), (0, 0, 90))):
            Circle(SKETCH5_R)
    cut_extrude4_tool1 = extrude(cut_extrude4_sk1.sketch, amount=CUT_EXTRUDE4_REACH, mode=Mode.PRIVATE) & cut_extrude4_end
    add(cut_extrude4_tool1.solids().sort_by_distance((-0.7, -11, -1.2))[0], mode=Mode.SUBTRACT)

    # Fillet6
    fillet6_edges = [part.edges().sort_by_distance(p)[0] for p in [
        (-0.700029875, -1.633510522, -0.800000001),
    ]]
    fillet(fillet6_edges, radius=FILLET6_R)


solid = part.part
